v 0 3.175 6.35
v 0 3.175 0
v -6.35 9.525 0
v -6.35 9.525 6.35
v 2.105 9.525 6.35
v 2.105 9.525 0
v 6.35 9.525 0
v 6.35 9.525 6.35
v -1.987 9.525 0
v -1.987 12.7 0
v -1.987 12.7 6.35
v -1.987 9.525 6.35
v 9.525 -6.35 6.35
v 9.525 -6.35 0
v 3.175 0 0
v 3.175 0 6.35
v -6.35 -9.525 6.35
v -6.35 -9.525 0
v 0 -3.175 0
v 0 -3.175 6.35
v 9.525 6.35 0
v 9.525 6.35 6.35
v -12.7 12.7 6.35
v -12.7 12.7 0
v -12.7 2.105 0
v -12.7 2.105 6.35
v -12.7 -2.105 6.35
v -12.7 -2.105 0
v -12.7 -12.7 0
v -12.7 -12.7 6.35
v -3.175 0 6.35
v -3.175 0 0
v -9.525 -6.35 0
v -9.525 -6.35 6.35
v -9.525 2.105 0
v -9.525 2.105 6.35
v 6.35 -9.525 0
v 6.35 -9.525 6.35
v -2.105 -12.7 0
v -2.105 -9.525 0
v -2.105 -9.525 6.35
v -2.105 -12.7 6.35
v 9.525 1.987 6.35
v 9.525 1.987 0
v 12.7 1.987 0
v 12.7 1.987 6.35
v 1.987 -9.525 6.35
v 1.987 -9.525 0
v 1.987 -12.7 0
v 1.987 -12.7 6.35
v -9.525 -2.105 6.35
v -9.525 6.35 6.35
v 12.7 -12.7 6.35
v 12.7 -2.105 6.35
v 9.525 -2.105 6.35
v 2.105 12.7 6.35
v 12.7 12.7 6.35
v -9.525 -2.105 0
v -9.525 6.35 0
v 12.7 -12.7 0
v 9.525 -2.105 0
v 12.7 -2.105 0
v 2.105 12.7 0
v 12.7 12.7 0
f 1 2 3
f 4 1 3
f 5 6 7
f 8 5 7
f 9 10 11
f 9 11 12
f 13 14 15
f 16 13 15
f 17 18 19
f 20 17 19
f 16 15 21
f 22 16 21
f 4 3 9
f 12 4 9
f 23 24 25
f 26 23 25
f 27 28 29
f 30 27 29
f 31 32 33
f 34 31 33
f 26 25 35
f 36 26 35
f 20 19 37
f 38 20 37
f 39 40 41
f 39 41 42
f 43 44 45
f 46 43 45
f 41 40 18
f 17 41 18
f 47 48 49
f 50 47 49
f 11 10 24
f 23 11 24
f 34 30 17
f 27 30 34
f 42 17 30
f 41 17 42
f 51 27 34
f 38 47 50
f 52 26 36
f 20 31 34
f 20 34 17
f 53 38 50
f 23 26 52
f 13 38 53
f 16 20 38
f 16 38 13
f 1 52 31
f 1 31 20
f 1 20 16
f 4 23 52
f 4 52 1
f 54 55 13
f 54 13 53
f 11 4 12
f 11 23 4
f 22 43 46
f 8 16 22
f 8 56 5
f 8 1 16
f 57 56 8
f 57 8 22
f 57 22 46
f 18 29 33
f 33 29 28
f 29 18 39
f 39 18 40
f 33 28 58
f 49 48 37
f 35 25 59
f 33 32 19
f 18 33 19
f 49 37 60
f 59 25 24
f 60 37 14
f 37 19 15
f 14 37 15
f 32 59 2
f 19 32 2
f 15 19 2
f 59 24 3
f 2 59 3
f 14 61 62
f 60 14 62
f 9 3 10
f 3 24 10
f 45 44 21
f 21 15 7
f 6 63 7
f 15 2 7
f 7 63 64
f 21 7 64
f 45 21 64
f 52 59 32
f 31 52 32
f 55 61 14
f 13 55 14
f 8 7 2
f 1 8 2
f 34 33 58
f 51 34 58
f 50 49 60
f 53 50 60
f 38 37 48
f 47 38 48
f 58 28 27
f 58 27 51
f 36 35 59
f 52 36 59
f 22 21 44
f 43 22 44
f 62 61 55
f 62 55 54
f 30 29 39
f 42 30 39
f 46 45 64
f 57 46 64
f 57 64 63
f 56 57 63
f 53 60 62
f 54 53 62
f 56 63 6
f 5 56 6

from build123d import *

# Parameters (mm, degrees)
F0_W     = 3.175
F0_H     = 3.175
F1_DEPTH = 6.35
F2_W     = 3.175
F2_H     = 4.0921564981
F2_H_2   = 0.1173117965
F2_H_3   = 3.9748447016
F2_W_2   = 4.0921564981
F2_H_4   = 3.175
F3_DEPTH = 25.4


with BuildPart() as f1:
    # F0 (on Top) → F1 (new body)
    with BuildSketch(Plane.XY):
        with Locations((-11.1125, 11.1125)):
            Rectangle(F0_W, F0_H)
        with Locations((11.1125, 11.1125)):
            Rectangle(F0_W, F0_H)
        with Locations((11.1125, -11.1125)):
            Rectangle(F0_W, F0_H)
        with Locations((-11.1125, -11.1125)):
            Rectangle(F0_W, F0_H)
        Polygon((6.35, 9.525), (9.525, 12.7), (-9.525, 12.7), (-6.35, 9.525), align=None)
        Polygon((-9.525, -12.7), (9.525, -12.7), (6.35, -9.525), (-6.35, -9.525), align=None)
        Polygon((12.7, -9.525), (12.7, 9.525), (9.525, 6.35), (9.525, -6.35), align=None)
        Polygon((-9.525, 6.35), (-12.7, 9.525), (-12.7, -9.525), (-9.525, -6.35), align=None)
        Polygon((9.525, 9.525), (9.525, 12.7), (6.35, 9.525), align=None)
        Polygon((-6.35, 9.525), (-9.525, 12.7), (-9.525, 9.525), align=None)
        Polygon((9.525, -12.7), (9.525, -9.525), (6.35, -9.525), align=None)
        Polygon((-9.525, -9.525), (-9.525, -12.7), (-6.35, -9.525), align=None)
        Polygon((9.525, 6.35), (12.7, 9.525), (9.525, 9.525), align=None)
        Polygon((9.525, -9.525), (12.7, -9.525), (9.525, -6.35), align=None)
        Polygon((-9.525, 6.35), (-9.525, 9.525), (-12.7, 9.525), align=None)
        Polygon((-9.525, -6.35), (-12.7, -9.525), (-9.525, -9.525), align=None)
        Polygon((9.525, 6.35), (9.525, 9.525), (6.35, 9.525), (0, 3.175), (3.175, 0), align=None)
        Polygon((-6.35, 9.525), (-9.525, 9.525), (-9.525, 6.35), (-3.175, 0), (0, 3.175), align=None)
        Polygon((6.35, -9.525), (9.525, -9.525), (9.525, -6.35), (3.175, 0), (0, -3.175), align=None)
        Polygon((3.175, 0), (0, 3.175), (-3.175, 0), (0, -3.175), align=None)
        Polygon((0, -3.175), (-3.175, 0), (-9.525, -6.35), (-9.525, -9.525), (-6.35, -9.525), align=None)
    extrude(amount=F1_DEPTH)

    # F2 (on face) → F3 (cut)
    with BuildSketch(Plane(origin=(0, 0, 0), x_dir=(1, 0, 0), z_dir=(0, 0, -1))):
        with Locations((11.1125, 0.0586558983)):
            Rectangle(F2_W, F2_H)
        with Locations((-11.1125, 2.0460782491)):
            Rectangle(F2_W, F2_H_2)
        with Locations((-11.1125, 0)):
            Rectangle(F2_W, F2_H_3)
        with Locations((-11.1125, -2.0460782491)):
            Rectangle(F2_W, F2_H_2)
        with Locations((-0.0586558983, 11.1125)):
            Rectangle(F2_W_2, F2_H_4)
        with Locations((0.0586558983, -11.1125)):
            Rectangle(F2_W_2, F2_H_4)
    extrude(amount=-F3_DEPTH, mode=Mode.SUBTRACT)


solid = f1.part
